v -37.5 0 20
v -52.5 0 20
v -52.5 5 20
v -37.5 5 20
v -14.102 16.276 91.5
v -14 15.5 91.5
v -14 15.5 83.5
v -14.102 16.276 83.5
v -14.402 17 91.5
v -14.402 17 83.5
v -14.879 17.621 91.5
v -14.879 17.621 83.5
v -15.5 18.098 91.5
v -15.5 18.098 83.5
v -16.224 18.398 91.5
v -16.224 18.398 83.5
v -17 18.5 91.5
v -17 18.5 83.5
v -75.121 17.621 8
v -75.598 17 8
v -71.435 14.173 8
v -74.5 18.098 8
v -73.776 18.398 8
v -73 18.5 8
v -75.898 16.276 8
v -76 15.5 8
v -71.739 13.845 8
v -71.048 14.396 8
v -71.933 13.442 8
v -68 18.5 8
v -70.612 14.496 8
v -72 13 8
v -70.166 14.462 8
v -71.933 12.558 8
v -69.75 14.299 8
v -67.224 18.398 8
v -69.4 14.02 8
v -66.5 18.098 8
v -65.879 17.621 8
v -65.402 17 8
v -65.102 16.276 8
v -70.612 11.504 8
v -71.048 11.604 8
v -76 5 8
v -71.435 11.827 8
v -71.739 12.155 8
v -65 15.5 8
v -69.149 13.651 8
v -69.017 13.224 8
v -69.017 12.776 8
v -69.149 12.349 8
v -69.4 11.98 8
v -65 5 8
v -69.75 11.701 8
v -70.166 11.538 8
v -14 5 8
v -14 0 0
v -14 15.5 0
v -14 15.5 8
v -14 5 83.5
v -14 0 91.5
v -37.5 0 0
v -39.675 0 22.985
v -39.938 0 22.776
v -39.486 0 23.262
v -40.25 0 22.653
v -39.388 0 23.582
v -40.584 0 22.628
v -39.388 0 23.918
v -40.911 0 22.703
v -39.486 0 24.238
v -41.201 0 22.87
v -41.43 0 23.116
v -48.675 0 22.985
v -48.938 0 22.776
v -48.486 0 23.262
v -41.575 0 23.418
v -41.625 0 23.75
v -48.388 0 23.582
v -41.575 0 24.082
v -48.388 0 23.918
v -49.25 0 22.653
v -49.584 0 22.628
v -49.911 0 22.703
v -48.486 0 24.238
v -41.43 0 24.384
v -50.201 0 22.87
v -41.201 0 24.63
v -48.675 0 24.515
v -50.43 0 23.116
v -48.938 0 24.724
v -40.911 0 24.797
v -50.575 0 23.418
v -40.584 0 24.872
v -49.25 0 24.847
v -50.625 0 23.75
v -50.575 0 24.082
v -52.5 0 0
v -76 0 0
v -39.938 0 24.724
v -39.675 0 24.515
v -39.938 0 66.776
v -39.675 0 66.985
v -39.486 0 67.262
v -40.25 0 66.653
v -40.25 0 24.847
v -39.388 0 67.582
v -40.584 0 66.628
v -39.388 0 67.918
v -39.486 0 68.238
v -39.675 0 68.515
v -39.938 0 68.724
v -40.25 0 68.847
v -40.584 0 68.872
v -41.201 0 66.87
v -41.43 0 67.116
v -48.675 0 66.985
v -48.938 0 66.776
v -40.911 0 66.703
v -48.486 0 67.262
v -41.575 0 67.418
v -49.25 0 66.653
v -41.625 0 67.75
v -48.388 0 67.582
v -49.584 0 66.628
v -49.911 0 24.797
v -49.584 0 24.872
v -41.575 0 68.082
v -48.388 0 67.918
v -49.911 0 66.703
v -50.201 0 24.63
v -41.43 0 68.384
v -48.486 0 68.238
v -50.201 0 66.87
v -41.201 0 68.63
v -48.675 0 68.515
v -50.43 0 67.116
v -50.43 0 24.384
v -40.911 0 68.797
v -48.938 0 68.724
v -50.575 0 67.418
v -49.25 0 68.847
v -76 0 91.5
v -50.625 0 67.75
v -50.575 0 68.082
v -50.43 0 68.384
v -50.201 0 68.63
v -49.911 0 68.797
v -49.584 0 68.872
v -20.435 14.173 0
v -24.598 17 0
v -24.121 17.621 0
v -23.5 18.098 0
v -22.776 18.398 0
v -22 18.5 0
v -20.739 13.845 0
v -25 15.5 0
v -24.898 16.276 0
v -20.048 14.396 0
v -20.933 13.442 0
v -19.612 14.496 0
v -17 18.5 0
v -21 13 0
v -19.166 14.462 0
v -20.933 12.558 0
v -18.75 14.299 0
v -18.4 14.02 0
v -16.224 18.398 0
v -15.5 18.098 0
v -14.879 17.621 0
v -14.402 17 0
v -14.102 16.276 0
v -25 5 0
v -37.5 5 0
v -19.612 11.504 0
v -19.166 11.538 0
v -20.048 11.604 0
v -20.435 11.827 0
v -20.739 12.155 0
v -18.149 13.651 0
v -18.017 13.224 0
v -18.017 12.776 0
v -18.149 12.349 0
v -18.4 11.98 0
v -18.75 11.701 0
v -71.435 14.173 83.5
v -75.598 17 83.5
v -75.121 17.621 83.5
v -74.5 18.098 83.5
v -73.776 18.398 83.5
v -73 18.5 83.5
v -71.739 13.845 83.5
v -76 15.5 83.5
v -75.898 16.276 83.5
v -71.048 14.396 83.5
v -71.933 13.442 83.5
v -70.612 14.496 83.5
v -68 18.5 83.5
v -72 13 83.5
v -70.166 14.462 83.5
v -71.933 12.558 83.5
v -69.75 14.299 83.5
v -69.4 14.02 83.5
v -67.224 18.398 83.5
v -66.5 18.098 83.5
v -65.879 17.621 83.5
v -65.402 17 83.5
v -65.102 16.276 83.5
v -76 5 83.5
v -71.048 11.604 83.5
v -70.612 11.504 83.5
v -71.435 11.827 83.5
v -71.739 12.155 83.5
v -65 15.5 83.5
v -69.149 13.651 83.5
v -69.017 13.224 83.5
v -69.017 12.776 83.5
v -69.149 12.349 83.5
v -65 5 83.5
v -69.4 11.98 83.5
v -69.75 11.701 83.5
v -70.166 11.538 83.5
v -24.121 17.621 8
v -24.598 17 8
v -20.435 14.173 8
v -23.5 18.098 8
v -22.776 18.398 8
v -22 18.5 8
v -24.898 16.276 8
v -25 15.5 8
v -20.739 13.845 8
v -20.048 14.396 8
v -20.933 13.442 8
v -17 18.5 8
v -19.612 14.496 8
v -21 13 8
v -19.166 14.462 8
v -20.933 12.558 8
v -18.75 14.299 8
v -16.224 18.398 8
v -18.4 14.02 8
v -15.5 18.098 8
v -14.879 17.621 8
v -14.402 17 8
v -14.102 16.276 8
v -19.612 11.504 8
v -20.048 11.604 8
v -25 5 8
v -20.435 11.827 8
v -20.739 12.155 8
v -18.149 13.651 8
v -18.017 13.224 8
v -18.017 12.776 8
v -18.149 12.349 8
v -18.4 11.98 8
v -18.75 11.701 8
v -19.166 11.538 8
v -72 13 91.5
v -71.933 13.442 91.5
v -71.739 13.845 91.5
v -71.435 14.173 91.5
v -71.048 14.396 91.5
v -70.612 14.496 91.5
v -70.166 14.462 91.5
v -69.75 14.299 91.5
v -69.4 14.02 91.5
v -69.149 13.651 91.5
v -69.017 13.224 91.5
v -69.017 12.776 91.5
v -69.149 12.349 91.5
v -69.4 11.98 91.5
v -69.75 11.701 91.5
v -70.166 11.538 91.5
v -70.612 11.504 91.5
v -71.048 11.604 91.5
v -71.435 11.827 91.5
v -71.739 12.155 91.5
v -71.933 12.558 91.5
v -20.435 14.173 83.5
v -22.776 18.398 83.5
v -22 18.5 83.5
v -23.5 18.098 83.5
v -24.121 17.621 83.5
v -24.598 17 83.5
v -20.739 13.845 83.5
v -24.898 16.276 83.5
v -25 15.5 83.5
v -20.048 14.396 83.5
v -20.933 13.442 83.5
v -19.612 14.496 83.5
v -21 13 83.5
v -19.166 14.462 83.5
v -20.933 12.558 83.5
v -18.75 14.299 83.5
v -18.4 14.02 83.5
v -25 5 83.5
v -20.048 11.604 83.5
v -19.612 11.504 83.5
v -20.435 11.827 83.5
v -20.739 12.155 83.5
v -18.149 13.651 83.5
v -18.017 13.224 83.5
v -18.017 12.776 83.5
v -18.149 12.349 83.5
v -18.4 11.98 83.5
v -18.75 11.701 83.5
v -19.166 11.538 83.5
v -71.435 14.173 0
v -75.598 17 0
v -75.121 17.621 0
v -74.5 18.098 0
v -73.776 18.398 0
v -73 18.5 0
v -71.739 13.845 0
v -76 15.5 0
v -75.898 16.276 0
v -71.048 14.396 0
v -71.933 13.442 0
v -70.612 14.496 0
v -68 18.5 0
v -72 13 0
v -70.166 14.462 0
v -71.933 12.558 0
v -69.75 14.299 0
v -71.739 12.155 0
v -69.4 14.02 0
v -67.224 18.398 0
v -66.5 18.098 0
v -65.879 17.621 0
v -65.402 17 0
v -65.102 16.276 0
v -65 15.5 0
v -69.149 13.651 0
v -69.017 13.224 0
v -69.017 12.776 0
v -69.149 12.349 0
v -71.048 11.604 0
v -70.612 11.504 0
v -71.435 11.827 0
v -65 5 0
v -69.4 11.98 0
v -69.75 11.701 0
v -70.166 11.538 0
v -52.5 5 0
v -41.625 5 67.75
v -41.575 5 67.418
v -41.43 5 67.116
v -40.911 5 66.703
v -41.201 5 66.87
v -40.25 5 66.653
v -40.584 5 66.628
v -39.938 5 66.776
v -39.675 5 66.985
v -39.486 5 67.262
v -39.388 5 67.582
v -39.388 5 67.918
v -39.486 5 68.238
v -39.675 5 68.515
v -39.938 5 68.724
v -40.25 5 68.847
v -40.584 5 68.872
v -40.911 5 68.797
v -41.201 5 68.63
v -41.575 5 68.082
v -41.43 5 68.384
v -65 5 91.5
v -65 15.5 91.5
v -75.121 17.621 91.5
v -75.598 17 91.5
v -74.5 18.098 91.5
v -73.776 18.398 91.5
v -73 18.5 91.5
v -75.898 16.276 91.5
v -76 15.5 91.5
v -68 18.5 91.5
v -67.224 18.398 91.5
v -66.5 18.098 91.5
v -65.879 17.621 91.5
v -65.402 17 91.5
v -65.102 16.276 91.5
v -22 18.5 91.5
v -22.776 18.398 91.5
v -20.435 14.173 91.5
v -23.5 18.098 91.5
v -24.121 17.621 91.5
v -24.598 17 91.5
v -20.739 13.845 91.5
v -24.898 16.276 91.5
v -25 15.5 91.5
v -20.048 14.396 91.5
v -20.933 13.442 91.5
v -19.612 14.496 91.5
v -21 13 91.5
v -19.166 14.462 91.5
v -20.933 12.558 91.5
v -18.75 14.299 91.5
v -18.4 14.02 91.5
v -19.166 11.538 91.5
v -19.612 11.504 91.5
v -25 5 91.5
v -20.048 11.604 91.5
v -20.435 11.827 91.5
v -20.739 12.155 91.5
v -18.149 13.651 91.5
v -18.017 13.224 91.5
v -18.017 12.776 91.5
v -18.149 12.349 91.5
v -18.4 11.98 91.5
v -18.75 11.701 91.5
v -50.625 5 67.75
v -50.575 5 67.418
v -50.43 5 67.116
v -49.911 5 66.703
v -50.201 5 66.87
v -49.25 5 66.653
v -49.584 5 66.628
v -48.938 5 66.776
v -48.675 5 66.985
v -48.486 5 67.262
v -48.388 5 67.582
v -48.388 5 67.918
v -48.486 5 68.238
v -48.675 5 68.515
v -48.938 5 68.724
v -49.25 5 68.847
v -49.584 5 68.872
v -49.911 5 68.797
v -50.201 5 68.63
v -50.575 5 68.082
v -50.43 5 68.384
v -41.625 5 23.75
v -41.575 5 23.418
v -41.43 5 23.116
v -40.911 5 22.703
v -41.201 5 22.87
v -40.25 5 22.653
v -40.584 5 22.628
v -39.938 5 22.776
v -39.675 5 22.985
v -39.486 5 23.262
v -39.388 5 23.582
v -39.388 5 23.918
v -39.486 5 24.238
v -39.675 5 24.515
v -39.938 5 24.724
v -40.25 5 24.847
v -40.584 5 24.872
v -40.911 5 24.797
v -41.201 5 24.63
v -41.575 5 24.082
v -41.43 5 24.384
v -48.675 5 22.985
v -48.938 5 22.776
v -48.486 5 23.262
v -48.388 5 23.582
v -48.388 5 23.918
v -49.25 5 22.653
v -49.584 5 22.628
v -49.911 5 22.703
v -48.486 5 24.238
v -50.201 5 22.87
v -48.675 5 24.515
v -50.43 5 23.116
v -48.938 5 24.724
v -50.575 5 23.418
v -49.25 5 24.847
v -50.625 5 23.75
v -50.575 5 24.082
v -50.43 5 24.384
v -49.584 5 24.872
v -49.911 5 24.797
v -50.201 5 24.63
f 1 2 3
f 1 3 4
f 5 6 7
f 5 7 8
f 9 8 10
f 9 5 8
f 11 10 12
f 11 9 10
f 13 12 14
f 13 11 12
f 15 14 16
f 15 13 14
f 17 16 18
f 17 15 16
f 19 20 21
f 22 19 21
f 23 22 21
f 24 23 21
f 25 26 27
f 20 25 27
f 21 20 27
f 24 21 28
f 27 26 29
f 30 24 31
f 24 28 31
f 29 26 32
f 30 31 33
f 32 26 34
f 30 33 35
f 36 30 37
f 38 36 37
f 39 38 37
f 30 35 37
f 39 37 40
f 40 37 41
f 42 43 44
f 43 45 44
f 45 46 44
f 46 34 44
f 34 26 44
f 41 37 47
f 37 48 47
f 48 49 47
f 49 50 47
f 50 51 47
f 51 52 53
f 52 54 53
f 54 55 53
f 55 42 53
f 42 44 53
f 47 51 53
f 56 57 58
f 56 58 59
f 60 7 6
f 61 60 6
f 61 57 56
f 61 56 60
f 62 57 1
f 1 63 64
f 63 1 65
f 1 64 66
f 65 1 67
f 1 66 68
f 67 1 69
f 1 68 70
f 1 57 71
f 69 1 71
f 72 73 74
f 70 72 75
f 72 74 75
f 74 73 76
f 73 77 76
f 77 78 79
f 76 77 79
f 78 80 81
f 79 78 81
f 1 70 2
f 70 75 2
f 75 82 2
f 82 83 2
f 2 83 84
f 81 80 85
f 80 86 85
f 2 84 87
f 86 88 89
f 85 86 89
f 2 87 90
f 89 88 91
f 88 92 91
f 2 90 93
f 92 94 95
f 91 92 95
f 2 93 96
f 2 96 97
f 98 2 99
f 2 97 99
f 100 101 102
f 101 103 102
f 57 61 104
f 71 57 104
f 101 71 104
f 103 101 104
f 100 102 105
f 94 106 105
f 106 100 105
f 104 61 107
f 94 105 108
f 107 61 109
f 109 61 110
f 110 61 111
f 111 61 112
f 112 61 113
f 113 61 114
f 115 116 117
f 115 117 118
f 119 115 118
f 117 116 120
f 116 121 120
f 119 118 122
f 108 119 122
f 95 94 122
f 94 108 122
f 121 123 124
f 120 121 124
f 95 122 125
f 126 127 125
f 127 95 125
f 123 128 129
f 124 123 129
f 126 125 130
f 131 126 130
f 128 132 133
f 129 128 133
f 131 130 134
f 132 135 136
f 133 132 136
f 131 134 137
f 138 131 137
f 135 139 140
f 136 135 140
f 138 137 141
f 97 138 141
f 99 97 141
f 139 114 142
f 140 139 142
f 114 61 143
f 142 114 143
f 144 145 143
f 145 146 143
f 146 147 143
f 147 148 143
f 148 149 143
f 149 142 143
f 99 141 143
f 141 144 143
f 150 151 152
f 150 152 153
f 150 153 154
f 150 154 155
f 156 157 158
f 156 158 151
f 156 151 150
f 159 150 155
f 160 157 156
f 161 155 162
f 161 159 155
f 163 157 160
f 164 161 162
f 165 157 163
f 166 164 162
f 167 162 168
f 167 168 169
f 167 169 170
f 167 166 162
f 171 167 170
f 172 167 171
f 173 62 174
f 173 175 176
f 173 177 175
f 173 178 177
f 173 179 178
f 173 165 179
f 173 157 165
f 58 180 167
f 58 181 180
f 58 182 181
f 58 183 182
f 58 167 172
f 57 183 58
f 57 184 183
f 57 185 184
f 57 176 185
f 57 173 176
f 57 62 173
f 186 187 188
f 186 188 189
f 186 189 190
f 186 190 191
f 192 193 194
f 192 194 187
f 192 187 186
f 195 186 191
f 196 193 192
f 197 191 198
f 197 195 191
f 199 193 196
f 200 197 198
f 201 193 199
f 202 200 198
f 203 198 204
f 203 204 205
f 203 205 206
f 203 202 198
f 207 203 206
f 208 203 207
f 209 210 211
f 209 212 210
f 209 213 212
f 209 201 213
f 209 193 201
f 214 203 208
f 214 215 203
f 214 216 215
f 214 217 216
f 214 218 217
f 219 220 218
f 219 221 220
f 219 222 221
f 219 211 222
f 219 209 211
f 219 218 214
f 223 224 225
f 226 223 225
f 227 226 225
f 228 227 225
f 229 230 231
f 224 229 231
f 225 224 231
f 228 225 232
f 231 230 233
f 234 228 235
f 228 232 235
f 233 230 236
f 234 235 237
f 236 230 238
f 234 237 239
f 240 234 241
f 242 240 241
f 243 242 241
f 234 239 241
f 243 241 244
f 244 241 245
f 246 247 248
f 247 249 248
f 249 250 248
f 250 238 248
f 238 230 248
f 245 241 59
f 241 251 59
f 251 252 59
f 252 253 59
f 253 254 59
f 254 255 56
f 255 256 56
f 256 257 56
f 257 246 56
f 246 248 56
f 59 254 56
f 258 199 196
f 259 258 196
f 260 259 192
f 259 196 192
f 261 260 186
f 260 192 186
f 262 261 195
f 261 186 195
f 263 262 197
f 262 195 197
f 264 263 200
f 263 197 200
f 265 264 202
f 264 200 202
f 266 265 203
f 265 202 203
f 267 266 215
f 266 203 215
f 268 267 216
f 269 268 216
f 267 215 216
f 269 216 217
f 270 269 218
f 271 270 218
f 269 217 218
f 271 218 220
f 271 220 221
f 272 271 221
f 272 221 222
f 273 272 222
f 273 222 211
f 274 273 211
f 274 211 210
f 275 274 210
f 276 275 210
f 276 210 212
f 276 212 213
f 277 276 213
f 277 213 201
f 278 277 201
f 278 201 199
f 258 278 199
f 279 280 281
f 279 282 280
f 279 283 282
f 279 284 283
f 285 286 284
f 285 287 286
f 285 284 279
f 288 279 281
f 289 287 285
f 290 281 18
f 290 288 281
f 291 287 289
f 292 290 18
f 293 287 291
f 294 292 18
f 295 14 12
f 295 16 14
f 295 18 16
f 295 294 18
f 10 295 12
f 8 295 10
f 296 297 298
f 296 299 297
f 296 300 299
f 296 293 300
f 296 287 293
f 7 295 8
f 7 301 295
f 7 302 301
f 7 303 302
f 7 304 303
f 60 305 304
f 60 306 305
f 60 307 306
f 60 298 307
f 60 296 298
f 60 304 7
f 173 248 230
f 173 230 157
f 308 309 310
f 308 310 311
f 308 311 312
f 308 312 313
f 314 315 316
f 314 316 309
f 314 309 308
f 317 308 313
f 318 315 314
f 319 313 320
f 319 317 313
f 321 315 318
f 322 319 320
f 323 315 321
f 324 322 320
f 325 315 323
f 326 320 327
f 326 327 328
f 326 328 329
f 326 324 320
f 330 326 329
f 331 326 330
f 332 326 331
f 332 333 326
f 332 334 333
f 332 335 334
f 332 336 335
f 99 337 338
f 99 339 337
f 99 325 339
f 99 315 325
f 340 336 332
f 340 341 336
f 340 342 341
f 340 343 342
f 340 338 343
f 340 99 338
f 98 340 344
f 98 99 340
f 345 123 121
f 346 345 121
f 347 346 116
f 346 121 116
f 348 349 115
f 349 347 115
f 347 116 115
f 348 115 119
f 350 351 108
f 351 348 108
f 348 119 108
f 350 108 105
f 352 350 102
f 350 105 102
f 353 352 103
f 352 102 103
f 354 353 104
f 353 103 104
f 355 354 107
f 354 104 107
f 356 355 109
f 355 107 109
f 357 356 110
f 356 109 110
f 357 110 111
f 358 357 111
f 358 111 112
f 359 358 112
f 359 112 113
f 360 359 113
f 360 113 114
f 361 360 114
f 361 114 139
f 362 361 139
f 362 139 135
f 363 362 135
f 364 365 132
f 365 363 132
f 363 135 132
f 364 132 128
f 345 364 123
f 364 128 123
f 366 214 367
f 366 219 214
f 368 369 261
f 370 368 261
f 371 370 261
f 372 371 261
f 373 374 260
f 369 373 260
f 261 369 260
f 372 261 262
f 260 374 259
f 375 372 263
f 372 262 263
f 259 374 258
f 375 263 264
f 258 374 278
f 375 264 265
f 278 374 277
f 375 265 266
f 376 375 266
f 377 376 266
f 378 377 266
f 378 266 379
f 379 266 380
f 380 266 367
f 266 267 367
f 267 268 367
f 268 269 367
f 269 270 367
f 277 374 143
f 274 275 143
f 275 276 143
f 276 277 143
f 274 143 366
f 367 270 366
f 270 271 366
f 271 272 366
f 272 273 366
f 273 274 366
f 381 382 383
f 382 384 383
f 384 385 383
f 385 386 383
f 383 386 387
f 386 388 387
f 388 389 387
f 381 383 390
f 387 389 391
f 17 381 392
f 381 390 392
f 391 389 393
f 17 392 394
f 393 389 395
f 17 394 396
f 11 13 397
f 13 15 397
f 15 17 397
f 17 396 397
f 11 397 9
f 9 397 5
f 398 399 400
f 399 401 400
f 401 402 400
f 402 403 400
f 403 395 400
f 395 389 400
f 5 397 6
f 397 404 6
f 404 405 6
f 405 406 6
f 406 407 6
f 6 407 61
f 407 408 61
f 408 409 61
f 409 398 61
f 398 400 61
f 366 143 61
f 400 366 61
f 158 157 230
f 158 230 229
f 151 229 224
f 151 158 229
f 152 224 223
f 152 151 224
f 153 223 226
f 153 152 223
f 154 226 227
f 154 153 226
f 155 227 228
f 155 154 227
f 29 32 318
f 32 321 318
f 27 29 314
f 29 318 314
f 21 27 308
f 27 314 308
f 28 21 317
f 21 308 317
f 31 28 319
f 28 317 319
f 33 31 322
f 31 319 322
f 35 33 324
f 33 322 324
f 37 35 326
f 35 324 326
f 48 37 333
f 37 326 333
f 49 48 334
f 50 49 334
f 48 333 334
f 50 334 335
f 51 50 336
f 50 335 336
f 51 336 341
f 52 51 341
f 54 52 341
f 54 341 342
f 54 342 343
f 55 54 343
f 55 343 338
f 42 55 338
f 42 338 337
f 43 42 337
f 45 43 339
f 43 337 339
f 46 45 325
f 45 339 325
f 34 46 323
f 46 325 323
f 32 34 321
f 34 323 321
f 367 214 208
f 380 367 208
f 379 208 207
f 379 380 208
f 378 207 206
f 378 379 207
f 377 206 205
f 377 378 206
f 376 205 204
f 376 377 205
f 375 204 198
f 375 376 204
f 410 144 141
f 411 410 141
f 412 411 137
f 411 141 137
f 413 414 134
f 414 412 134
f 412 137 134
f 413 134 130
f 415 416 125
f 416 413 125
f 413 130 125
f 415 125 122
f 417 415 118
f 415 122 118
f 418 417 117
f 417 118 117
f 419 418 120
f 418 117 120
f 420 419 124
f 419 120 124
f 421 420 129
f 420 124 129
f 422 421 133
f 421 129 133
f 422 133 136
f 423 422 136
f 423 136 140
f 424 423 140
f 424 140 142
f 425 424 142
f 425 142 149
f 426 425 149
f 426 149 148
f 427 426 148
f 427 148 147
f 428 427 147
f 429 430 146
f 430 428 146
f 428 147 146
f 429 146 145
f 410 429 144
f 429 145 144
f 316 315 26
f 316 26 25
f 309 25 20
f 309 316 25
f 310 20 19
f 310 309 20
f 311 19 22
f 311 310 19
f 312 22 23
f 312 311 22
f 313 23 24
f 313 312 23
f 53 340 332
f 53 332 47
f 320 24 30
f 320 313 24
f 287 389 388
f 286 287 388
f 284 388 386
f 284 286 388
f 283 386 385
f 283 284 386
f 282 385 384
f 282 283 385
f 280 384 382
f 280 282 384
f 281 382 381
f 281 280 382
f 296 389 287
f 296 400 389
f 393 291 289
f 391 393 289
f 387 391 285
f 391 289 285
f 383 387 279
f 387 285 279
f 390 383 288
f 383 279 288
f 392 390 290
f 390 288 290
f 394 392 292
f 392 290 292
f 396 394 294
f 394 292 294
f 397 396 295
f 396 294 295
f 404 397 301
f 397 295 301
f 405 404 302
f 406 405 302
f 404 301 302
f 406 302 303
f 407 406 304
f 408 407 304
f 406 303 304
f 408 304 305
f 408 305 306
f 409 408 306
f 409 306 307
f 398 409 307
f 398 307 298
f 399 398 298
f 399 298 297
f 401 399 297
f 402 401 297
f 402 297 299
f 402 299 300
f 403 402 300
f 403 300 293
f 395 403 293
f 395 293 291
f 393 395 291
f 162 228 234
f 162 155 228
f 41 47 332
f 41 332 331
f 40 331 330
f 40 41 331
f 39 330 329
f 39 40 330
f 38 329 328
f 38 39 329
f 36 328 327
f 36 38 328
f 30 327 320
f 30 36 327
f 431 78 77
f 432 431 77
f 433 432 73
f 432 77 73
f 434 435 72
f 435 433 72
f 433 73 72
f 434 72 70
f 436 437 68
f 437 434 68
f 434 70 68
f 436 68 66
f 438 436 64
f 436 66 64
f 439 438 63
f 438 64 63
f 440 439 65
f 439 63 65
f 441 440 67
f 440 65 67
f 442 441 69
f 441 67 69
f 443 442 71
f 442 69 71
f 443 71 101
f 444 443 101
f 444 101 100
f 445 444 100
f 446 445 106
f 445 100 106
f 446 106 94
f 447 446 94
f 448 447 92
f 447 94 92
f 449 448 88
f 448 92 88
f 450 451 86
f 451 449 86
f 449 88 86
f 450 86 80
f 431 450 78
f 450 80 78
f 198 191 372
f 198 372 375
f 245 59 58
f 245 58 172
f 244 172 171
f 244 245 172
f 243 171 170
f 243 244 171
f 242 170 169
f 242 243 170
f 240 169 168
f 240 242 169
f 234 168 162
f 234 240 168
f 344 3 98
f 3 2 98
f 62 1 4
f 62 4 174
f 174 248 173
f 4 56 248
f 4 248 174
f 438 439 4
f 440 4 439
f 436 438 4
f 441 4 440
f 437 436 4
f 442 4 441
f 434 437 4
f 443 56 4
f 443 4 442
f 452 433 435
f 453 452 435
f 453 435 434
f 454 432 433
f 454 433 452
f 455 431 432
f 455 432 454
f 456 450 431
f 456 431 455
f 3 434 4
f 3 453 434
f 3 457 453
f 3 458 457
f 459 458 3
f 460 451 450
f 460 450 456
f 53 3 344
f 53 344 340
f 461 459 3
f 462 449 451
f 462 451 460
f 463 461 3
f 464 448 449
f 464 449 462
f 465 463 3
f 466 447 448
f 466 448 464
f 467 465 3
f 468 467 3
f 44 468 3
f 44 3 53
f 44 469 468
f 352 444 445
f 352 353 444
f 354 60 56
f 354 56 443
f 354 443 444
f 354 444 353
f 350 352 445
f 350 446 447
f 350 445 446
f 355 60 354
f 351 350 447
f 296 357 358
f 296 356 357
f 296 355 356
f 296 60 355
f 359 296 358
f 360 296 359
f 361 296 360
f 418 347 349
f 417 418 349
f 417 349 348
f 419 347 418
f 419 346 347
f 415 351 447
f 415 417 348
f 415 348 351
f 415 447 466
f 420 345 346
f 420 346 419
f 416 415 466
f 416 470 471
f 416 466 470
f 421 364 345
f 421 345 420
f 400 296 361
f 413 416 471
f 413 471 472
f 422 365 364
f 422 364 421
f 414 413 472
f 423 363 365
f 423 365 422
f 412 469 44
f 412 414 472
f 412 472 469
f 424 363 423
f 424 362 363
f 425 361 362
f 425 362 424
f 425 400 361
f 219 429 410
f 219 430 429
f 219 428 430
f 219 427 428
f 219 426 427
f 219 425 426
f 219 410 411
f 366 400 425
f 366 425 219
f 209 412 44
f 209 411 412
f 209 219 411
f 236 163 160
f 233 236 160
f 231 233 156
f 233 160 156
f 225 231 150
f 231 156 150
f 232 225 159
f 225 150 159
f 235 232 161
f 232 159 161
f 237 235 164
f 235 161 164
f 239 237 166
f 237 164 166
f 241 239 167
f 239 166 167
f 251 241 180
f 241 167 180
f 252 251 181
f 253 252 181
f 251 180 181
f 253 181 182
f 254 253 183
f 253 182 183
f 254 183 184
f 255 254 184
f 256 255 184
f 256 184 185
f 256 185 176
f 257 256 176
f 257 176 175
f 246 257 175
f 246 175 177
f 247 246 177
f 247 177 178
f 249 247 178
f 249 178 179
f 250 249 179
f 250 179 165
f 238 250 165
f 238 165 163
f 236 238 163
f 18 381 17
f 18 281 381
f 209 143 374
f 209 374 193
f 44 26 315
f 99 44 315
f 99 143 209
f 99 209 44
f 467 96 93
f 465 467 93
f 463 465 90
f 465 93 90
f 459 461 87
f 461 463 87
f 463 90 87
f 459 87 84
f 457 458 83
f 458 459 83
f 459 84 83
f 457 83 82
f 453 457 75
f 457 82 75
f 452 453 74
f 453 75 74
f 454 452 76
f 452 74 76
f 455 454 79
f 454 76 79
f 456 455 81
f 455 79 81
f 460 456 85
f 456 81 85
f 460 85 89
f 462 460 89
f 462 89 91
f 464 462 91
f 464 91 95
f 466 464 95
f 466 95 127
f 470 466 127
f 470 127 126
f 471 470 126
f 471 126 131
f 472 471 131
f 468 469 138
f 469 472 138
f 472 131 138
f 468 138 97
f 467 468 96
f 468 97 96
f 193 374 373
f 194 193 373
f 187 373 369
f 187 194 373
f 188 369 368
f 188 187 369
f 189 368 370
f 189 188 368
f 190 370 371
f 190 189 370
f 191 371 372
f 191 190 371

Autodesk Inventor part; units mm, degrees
ref_plane "YZ Plane" through (0, 0, 0) normal (1, 0, 0) x (0, 1, 0)
ref_plane "XZ Plane" through (0, 0, 0) normal (0, 1, 0) x (-1, 0, 0)
ref_plane "XY Plane" through (0, 0, 0) normal (0, 0, 1) x (1, 0, 0)
sketch "Sketch1" plane through (0, 0, 0) normal (0, 1, 0) x (-1, 0, 0)
  line L0 (14, 91.5) -> (76, 91.5)
  line L1 (45, 91.5) -> (45, 1.5) construction
  circle A0 centre (49.5, 67.75) radius 1.125
  circle A1 centre (49.5, 23.75) radius 1.125
  line L2 (0, 45.75) -> (90, 45.75) construction
  circle A2 centre (40.5, 67.75) radius 1.125
  circle A3 centre (40.5, 23.75) radius 1.125
  line L3 (37.5, 20) -> (37.5, 0)
  line L4 (52.5, 20) -> (52.5, 0)
  line L5 (76, 0) -> (52.5, 0)
  line L6 (37.5, 0) -> (0, 0)
  line L7 (52.5, 20) -> (37.5, 20)
  line L8 (14, 0) -> (14, 91.5)
  line L9 (76, 0) -> (76, 91.5)
  dimension "d4" = 2.25
  dimension "d5" = 2.25
  dimension "d6" = 22
  dimension "d7" = 22
  dimension "d8" = 4.5
  dimension "d9" = 4.5
  dimension "d45" = 20
extrude "Extrusion1" add sketch "Sketch1" along normal blind 5
sketch "Sketch4" plane through (0, 5, 0) normal (0, 1, 0) x (1, 0, 0)
  line L0 (-37.5, -20) -> (-52.5, -20) projected
  line L1 (-76, -91.5) -> (-14, -91.5) projected
  line L2 (-45, -91.5) -> (-45, -20) construction
  line L3 (-25, -83.5) -> (-14, -83.5)
  line L4 (-14, -83.5) -> (-14, -91.5)
  line L5 (-14, -91.5) -> (-25, -91.5)
  line L6 (-25, -91.5) -> (-25, -83.5)
  dimension "d28" = 11
  dimension "d29" = 8
  dimension "d30" = 0
  dimension "d31" = 20
extrude "Extrusion4" add sketch "Sketch4" along normal blind 13.5
sketch "Sketch5" plane through (-14, 5, 83.5) normal (0, 0, -1) x (-1, 0, 0)
  line L0 (11, 0) -> (11, 13.5) projected
  line L1 (0, 13.5) -> (11, 13.5) projected
  circle A0 centre (5.5, 8) radius 1.5
  point P0 (-14, -5)
  dimension "d34" = 3
  dimension "d35" = 5.5
  dimension "d36" = 5.5
extrude "Extrusion5" cut sketch "Sketch5" against normal blind 8
fillet "Fillet1" radius 3 2 edges at (-14, 18.5, 87.5) (-25, 18.5, 87.5)
pattern_linear "Rectangular Pattern4" count 2 spacing 83.5 along (0, 0, -1) count 2 spacing 51 along (-1, 0, 0) of "Extrusion4", "Fillet1", "Extrusion5"
properties part number "Base1"
